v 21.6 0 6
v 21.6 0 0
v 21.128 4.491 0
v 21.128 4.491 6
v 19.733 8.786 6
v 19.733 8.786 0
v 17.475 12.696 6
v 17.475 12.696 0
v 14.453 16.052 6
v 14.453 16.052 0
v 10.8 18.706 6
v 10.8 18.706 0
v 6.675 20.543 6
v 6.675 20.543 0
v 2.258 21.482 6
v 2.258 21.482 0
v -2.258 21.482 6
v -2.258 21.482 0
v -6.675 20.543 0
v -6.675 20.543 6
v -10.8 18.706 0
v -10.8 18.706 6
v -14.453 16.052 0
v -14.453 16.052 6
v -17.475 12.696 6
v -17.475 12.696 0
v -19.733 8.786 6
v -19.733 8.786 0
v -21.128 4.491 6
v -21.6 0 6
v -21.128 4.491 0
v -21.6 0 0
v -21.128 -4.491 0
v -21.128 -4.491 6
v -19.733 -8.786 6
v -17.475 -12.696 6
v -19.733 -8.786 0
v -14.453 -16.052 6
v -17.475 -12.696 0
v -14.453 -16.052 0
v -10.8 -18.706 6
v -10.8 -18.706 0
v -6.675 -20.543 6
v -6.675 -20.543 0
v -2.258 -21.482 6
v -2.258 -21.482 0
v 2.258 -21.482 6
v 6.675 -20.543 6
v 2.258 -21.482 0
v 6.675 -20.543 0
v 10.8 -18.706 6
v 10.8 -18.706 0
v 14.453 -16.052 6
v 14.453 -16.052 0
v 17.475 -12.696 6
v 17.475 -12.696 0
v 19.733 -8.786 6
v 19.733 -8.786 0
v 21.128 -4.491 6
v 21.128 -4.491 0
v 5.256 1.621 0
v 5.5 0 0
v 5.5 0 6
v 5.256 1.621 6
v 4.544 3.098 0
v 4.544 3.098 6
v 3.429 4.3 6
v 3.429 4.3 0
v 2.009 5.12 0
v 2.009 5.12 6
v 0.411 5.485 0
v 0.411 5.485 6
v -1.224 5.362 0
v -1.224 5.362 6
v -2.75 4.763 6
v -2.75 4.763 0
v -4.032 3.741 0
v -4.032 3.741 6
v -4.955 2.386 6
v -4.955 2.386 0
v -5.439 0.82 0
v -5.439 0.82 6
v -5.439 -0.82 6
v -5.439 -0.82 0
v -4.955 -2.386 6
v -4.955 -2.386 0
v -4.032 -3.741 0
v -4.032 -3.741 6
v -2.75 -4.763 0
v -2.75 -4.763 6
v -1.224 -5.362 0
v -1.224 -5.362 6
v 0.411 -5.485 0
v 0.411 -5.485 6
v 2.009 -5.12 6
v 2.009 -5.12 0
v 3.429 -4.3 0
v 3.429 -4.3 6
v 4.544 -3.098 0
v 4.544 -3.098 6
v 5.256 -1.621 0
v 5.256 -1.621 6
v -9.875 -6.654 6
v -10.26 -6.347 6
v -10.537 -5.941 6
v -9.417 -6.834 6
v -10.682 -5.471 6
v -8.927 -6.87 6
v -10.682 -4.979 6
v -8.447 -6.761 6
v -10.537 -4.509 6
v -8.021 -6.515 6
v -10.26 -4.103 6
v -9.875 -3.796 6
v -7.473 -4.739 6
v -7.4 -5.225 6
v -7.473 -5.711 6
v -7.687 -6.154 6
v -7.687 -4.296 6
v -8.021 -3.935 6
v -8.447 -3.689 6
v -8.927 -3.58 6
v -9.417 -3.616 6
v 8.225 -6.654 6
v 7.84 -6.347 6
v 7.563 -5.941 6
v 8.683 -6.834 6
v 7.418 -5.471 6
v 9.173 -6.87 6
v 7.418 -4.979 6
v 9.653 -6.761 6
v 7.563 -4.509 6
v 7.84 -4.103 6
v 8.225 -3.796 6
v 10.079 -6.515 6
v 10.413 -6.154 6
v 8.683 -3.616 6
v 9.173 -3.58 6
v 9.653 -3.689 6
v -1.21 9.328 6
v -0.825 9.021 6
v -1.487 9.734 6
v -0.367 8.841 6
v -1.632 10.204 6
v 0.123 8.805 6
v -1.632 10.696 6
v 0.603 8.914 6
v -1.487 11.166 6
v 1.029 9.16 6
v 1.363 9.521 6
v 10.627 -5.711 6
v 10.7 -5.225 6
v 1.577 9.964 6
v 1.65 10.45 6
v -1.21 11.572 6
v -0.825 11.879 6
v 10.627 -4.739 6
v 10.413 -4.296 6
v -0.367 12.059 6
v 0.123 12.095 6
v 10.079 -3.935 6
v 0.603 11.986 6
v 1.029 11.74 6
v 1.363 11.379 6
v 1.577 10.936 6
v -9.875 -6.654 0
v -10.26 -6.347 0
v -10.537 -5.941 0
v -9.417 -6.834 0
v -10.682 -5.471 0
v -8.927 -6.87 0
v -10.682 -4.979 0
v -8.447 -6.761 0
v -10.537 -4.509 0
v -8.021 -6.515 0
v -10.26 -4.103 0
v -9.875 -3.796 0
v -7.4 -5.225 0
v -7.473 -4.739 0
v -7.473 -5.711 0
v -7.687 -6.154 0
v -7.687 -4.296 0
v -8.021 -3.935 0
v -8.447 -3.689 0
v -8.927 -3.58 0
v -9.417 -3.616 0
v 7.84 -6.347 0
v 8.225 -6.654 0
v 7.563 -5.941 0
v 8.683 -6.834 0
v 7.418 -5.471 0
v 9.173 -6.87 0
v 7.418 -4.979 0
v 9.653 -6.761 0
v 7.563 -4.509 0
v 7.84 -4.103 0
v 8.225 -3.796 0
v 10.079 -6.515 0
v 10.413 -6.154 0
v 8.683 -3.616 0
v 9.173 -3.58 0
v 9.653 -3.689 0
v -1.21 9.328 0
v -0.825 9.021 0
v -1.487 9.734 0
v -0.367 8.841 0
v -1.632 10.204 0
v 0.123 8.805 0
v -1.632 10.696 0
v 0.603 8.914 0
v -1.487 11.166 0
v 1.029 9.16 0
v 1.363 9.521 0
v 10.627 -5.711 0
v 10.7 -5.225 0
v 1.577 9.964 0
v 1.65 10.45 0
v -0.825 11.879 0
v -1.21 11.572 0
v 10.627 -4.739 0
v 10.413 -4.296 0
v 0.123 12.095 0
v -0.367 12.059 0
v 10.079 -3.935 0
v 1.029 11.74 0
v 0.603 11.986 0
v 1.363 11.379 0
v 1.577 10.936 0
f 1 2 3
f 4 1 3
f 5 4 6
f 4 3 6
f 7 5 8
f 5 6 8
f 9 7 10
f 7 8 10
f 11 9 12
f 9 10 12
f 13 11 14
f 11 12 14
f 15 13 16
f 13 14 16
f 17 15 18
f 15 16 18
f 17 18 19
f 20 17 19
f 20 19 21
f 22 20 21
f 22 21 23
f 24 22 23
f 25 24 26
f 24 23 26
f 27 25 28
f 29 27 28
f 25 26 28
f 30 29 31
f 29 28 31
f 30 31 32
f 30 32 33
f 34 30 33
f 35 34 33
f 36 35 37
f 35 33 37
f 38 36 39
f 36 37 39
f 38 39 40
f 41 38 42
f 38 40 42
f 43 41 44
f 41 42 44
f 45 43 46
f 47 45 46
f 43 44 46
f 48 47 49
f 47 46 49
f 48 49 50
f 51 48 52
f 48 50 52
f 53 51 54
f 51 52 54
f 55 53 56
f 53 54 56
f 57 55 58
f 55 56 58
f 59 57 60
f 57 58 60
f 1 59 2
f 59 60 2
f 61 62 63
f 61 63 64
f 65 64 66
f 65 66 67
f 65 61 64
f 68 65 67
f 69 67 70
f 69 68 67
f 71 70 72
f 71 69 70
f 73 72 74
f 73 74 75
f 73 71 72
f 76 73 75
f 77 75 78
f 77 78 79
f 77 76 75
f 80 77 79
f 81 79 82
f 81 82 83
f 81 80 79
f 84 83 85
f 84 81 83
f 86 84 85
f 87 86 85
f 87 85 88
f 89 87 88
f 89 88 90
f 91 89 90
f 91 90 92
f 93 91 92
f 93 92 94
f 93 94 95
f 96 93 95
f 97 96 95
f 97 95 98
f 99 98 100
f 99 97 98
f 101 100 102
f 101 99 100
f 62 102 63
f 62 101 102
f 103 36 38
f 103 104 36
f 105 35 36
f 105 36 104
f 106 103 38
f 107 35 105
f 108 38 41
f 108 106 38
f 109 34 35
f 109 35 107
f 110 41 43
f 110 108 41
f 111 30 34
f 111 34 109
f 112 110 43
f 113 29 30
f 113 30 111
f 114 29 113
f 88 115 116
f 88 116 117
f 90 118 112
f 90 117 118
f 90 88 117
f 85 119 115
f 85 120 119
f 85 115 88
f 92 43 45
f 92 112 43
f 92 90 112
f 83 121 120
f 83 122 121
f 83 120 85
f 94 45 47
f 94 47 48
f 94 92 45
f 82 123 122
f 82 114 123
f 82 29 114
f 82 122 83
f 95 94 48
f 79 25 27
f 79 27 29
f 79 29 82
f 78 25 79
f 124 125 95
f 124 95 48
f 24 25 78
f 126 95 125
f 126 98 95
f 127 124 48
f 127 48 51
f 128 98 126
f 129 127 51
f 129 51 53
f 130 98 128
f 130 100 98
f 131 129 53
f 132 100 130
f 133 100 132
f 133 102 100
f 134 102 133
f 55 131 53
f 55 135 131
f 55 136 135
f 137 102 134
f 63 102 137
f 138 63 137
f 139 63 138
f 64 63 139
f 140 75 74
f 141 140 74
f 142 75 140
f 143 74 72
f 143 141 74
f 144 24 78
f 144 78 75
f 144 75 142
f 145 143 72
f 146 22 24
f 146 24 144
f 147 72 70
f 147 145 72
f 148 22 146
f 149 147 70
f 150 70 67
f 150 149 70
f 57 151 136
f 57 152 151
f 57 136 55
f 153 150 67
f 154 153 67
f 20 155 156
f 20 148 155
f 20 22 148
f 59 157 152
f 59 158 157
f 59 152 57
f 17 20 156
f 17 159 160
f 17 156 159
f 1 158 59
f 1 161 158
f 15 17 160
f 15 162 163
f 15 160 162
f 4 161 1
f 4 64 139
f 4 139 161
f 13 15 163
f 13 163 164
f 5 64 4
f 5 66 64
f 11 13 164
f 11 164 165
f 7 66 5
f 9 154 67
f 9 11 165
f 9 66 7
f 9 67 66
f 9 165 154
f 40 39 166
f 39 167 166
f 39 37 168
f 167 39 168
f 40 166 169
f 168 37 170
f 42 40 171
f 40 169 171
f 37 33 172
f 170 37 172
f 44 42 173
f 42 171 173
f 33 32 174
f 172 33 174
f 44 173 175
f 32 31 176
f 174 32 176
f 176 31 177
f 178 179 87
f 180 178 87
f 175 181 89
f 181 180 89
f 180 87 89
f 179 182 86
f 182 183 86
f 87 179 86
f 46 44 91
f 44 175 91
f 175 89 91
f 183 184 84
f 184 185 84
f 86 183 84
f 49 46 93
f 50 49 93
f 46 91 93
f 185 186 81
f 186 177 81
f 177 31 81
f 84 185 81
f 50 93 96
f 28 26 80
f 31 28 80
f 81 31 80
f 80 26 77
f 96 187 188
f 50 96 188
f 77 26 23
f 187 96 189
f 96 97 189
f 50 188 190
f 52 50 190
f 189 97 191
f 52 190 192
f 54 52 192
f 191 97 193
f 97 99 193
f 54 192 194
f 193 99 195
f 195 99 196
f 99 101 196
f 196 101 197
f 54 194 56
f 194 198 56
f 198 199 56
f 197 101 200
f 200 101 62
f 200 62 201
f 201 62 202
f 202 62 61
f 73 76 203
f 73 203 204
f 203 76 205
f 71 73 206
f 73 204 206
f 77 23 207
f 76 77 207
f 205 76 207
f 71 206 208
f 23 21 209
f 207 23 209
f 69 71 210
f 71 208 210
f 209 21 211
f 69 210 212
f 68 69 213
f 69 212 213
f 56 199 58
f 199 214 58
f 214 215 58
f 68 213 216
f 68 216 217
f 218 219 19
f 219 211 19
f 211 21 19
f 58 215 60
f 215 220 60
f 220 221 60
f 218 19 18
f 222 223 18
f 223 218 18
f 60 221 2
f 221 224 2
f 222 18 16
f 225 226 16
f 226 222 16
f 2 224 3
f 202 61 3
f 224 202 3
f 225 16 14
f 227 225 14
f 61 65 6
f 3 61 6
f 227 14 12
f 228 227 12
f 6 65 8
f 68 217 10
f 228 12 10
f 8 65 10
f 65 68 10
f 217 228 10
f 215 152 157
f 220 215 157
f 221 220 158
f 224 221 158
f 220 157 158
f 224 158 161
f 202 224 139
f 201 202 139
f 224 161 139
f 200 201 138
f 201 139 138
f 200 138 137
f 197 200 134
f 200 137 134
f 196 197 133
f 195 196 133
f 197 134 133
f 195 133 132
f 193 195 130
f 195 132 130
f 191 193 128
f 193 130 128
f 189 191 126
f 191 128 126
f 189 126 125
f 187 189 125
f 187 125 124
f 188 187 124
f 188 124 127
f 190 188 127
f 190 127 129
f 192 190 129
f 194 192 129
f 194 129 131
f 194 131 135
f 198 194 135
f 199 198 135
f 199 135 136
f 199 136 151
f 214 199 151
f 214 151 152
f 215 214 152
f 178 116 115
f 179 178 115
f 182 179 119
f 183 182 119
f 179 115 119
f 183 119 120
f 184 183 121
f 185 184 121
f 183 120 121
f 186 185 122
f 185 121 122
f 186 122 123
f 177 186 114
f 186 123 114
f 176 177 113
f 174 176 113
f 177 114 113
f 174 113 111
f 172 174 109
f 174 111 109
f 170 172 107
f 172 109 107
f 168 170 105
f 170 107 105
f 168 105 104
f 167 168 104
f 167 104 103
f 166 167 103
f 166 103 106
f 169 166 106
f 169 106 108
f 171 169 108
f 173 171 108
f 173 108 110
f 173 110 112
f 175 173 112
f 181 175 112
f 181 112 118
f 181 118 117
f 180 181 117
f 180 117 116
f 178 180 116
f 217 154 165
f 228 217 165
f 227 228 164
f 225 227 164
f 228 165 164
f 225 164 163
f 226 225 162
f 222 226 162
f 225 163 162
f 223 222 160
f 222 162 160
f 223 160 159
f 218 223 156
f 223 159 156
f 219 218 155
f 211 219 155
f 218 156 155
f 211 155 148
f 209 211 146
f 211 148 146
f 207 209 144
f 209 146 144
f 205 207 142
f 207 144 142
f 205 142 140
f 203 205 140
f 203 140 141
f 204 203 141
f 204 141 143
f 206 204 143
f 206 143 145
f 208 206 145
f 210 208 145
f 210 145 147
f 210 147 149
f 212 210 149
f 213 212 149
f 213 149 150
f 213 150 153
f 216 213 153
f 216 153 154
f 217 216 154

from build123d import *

# Parameters (mm, degrees)
SKETCH1_R           = 21.6
SKETCH1_R_2         = 5.5
BOSS_EXTRUDE1_DEPTH = 6
SKETCH2_R           = 1.65
CUT_EXTRUDE1_DEPTH  = 7


with BuildPart() as part:
    # Sketch1 → Boss-Extrude1 (new body)
    with BuildSketch(Plane.XY):
        Circle(SKETCH1_R)
        Circle(SKETCH1_R_2, mode=Mode.SUBTRACT)
    extrude(amount=BOSS_EXTRUDE1_DEPTH)

    # Sketch2 → Cut-Extrude1 (cut, through all)
    with BuildSketch(Plane.XY.offset(6)):
        with Locations((0, 10.45)):
            Circle(SKETCH2_R)
        with Locations((9.04996547, -5.225)):
            Circle(SKETCH2_R)
        with Locations((-9.04996547, -5.225)):
            Circle(SKETCH2_R)
    extrude(amount=-CUT_EXTRUDE1_DEPTH, mode=Mode.SUBTRACT)


solid = part.part
